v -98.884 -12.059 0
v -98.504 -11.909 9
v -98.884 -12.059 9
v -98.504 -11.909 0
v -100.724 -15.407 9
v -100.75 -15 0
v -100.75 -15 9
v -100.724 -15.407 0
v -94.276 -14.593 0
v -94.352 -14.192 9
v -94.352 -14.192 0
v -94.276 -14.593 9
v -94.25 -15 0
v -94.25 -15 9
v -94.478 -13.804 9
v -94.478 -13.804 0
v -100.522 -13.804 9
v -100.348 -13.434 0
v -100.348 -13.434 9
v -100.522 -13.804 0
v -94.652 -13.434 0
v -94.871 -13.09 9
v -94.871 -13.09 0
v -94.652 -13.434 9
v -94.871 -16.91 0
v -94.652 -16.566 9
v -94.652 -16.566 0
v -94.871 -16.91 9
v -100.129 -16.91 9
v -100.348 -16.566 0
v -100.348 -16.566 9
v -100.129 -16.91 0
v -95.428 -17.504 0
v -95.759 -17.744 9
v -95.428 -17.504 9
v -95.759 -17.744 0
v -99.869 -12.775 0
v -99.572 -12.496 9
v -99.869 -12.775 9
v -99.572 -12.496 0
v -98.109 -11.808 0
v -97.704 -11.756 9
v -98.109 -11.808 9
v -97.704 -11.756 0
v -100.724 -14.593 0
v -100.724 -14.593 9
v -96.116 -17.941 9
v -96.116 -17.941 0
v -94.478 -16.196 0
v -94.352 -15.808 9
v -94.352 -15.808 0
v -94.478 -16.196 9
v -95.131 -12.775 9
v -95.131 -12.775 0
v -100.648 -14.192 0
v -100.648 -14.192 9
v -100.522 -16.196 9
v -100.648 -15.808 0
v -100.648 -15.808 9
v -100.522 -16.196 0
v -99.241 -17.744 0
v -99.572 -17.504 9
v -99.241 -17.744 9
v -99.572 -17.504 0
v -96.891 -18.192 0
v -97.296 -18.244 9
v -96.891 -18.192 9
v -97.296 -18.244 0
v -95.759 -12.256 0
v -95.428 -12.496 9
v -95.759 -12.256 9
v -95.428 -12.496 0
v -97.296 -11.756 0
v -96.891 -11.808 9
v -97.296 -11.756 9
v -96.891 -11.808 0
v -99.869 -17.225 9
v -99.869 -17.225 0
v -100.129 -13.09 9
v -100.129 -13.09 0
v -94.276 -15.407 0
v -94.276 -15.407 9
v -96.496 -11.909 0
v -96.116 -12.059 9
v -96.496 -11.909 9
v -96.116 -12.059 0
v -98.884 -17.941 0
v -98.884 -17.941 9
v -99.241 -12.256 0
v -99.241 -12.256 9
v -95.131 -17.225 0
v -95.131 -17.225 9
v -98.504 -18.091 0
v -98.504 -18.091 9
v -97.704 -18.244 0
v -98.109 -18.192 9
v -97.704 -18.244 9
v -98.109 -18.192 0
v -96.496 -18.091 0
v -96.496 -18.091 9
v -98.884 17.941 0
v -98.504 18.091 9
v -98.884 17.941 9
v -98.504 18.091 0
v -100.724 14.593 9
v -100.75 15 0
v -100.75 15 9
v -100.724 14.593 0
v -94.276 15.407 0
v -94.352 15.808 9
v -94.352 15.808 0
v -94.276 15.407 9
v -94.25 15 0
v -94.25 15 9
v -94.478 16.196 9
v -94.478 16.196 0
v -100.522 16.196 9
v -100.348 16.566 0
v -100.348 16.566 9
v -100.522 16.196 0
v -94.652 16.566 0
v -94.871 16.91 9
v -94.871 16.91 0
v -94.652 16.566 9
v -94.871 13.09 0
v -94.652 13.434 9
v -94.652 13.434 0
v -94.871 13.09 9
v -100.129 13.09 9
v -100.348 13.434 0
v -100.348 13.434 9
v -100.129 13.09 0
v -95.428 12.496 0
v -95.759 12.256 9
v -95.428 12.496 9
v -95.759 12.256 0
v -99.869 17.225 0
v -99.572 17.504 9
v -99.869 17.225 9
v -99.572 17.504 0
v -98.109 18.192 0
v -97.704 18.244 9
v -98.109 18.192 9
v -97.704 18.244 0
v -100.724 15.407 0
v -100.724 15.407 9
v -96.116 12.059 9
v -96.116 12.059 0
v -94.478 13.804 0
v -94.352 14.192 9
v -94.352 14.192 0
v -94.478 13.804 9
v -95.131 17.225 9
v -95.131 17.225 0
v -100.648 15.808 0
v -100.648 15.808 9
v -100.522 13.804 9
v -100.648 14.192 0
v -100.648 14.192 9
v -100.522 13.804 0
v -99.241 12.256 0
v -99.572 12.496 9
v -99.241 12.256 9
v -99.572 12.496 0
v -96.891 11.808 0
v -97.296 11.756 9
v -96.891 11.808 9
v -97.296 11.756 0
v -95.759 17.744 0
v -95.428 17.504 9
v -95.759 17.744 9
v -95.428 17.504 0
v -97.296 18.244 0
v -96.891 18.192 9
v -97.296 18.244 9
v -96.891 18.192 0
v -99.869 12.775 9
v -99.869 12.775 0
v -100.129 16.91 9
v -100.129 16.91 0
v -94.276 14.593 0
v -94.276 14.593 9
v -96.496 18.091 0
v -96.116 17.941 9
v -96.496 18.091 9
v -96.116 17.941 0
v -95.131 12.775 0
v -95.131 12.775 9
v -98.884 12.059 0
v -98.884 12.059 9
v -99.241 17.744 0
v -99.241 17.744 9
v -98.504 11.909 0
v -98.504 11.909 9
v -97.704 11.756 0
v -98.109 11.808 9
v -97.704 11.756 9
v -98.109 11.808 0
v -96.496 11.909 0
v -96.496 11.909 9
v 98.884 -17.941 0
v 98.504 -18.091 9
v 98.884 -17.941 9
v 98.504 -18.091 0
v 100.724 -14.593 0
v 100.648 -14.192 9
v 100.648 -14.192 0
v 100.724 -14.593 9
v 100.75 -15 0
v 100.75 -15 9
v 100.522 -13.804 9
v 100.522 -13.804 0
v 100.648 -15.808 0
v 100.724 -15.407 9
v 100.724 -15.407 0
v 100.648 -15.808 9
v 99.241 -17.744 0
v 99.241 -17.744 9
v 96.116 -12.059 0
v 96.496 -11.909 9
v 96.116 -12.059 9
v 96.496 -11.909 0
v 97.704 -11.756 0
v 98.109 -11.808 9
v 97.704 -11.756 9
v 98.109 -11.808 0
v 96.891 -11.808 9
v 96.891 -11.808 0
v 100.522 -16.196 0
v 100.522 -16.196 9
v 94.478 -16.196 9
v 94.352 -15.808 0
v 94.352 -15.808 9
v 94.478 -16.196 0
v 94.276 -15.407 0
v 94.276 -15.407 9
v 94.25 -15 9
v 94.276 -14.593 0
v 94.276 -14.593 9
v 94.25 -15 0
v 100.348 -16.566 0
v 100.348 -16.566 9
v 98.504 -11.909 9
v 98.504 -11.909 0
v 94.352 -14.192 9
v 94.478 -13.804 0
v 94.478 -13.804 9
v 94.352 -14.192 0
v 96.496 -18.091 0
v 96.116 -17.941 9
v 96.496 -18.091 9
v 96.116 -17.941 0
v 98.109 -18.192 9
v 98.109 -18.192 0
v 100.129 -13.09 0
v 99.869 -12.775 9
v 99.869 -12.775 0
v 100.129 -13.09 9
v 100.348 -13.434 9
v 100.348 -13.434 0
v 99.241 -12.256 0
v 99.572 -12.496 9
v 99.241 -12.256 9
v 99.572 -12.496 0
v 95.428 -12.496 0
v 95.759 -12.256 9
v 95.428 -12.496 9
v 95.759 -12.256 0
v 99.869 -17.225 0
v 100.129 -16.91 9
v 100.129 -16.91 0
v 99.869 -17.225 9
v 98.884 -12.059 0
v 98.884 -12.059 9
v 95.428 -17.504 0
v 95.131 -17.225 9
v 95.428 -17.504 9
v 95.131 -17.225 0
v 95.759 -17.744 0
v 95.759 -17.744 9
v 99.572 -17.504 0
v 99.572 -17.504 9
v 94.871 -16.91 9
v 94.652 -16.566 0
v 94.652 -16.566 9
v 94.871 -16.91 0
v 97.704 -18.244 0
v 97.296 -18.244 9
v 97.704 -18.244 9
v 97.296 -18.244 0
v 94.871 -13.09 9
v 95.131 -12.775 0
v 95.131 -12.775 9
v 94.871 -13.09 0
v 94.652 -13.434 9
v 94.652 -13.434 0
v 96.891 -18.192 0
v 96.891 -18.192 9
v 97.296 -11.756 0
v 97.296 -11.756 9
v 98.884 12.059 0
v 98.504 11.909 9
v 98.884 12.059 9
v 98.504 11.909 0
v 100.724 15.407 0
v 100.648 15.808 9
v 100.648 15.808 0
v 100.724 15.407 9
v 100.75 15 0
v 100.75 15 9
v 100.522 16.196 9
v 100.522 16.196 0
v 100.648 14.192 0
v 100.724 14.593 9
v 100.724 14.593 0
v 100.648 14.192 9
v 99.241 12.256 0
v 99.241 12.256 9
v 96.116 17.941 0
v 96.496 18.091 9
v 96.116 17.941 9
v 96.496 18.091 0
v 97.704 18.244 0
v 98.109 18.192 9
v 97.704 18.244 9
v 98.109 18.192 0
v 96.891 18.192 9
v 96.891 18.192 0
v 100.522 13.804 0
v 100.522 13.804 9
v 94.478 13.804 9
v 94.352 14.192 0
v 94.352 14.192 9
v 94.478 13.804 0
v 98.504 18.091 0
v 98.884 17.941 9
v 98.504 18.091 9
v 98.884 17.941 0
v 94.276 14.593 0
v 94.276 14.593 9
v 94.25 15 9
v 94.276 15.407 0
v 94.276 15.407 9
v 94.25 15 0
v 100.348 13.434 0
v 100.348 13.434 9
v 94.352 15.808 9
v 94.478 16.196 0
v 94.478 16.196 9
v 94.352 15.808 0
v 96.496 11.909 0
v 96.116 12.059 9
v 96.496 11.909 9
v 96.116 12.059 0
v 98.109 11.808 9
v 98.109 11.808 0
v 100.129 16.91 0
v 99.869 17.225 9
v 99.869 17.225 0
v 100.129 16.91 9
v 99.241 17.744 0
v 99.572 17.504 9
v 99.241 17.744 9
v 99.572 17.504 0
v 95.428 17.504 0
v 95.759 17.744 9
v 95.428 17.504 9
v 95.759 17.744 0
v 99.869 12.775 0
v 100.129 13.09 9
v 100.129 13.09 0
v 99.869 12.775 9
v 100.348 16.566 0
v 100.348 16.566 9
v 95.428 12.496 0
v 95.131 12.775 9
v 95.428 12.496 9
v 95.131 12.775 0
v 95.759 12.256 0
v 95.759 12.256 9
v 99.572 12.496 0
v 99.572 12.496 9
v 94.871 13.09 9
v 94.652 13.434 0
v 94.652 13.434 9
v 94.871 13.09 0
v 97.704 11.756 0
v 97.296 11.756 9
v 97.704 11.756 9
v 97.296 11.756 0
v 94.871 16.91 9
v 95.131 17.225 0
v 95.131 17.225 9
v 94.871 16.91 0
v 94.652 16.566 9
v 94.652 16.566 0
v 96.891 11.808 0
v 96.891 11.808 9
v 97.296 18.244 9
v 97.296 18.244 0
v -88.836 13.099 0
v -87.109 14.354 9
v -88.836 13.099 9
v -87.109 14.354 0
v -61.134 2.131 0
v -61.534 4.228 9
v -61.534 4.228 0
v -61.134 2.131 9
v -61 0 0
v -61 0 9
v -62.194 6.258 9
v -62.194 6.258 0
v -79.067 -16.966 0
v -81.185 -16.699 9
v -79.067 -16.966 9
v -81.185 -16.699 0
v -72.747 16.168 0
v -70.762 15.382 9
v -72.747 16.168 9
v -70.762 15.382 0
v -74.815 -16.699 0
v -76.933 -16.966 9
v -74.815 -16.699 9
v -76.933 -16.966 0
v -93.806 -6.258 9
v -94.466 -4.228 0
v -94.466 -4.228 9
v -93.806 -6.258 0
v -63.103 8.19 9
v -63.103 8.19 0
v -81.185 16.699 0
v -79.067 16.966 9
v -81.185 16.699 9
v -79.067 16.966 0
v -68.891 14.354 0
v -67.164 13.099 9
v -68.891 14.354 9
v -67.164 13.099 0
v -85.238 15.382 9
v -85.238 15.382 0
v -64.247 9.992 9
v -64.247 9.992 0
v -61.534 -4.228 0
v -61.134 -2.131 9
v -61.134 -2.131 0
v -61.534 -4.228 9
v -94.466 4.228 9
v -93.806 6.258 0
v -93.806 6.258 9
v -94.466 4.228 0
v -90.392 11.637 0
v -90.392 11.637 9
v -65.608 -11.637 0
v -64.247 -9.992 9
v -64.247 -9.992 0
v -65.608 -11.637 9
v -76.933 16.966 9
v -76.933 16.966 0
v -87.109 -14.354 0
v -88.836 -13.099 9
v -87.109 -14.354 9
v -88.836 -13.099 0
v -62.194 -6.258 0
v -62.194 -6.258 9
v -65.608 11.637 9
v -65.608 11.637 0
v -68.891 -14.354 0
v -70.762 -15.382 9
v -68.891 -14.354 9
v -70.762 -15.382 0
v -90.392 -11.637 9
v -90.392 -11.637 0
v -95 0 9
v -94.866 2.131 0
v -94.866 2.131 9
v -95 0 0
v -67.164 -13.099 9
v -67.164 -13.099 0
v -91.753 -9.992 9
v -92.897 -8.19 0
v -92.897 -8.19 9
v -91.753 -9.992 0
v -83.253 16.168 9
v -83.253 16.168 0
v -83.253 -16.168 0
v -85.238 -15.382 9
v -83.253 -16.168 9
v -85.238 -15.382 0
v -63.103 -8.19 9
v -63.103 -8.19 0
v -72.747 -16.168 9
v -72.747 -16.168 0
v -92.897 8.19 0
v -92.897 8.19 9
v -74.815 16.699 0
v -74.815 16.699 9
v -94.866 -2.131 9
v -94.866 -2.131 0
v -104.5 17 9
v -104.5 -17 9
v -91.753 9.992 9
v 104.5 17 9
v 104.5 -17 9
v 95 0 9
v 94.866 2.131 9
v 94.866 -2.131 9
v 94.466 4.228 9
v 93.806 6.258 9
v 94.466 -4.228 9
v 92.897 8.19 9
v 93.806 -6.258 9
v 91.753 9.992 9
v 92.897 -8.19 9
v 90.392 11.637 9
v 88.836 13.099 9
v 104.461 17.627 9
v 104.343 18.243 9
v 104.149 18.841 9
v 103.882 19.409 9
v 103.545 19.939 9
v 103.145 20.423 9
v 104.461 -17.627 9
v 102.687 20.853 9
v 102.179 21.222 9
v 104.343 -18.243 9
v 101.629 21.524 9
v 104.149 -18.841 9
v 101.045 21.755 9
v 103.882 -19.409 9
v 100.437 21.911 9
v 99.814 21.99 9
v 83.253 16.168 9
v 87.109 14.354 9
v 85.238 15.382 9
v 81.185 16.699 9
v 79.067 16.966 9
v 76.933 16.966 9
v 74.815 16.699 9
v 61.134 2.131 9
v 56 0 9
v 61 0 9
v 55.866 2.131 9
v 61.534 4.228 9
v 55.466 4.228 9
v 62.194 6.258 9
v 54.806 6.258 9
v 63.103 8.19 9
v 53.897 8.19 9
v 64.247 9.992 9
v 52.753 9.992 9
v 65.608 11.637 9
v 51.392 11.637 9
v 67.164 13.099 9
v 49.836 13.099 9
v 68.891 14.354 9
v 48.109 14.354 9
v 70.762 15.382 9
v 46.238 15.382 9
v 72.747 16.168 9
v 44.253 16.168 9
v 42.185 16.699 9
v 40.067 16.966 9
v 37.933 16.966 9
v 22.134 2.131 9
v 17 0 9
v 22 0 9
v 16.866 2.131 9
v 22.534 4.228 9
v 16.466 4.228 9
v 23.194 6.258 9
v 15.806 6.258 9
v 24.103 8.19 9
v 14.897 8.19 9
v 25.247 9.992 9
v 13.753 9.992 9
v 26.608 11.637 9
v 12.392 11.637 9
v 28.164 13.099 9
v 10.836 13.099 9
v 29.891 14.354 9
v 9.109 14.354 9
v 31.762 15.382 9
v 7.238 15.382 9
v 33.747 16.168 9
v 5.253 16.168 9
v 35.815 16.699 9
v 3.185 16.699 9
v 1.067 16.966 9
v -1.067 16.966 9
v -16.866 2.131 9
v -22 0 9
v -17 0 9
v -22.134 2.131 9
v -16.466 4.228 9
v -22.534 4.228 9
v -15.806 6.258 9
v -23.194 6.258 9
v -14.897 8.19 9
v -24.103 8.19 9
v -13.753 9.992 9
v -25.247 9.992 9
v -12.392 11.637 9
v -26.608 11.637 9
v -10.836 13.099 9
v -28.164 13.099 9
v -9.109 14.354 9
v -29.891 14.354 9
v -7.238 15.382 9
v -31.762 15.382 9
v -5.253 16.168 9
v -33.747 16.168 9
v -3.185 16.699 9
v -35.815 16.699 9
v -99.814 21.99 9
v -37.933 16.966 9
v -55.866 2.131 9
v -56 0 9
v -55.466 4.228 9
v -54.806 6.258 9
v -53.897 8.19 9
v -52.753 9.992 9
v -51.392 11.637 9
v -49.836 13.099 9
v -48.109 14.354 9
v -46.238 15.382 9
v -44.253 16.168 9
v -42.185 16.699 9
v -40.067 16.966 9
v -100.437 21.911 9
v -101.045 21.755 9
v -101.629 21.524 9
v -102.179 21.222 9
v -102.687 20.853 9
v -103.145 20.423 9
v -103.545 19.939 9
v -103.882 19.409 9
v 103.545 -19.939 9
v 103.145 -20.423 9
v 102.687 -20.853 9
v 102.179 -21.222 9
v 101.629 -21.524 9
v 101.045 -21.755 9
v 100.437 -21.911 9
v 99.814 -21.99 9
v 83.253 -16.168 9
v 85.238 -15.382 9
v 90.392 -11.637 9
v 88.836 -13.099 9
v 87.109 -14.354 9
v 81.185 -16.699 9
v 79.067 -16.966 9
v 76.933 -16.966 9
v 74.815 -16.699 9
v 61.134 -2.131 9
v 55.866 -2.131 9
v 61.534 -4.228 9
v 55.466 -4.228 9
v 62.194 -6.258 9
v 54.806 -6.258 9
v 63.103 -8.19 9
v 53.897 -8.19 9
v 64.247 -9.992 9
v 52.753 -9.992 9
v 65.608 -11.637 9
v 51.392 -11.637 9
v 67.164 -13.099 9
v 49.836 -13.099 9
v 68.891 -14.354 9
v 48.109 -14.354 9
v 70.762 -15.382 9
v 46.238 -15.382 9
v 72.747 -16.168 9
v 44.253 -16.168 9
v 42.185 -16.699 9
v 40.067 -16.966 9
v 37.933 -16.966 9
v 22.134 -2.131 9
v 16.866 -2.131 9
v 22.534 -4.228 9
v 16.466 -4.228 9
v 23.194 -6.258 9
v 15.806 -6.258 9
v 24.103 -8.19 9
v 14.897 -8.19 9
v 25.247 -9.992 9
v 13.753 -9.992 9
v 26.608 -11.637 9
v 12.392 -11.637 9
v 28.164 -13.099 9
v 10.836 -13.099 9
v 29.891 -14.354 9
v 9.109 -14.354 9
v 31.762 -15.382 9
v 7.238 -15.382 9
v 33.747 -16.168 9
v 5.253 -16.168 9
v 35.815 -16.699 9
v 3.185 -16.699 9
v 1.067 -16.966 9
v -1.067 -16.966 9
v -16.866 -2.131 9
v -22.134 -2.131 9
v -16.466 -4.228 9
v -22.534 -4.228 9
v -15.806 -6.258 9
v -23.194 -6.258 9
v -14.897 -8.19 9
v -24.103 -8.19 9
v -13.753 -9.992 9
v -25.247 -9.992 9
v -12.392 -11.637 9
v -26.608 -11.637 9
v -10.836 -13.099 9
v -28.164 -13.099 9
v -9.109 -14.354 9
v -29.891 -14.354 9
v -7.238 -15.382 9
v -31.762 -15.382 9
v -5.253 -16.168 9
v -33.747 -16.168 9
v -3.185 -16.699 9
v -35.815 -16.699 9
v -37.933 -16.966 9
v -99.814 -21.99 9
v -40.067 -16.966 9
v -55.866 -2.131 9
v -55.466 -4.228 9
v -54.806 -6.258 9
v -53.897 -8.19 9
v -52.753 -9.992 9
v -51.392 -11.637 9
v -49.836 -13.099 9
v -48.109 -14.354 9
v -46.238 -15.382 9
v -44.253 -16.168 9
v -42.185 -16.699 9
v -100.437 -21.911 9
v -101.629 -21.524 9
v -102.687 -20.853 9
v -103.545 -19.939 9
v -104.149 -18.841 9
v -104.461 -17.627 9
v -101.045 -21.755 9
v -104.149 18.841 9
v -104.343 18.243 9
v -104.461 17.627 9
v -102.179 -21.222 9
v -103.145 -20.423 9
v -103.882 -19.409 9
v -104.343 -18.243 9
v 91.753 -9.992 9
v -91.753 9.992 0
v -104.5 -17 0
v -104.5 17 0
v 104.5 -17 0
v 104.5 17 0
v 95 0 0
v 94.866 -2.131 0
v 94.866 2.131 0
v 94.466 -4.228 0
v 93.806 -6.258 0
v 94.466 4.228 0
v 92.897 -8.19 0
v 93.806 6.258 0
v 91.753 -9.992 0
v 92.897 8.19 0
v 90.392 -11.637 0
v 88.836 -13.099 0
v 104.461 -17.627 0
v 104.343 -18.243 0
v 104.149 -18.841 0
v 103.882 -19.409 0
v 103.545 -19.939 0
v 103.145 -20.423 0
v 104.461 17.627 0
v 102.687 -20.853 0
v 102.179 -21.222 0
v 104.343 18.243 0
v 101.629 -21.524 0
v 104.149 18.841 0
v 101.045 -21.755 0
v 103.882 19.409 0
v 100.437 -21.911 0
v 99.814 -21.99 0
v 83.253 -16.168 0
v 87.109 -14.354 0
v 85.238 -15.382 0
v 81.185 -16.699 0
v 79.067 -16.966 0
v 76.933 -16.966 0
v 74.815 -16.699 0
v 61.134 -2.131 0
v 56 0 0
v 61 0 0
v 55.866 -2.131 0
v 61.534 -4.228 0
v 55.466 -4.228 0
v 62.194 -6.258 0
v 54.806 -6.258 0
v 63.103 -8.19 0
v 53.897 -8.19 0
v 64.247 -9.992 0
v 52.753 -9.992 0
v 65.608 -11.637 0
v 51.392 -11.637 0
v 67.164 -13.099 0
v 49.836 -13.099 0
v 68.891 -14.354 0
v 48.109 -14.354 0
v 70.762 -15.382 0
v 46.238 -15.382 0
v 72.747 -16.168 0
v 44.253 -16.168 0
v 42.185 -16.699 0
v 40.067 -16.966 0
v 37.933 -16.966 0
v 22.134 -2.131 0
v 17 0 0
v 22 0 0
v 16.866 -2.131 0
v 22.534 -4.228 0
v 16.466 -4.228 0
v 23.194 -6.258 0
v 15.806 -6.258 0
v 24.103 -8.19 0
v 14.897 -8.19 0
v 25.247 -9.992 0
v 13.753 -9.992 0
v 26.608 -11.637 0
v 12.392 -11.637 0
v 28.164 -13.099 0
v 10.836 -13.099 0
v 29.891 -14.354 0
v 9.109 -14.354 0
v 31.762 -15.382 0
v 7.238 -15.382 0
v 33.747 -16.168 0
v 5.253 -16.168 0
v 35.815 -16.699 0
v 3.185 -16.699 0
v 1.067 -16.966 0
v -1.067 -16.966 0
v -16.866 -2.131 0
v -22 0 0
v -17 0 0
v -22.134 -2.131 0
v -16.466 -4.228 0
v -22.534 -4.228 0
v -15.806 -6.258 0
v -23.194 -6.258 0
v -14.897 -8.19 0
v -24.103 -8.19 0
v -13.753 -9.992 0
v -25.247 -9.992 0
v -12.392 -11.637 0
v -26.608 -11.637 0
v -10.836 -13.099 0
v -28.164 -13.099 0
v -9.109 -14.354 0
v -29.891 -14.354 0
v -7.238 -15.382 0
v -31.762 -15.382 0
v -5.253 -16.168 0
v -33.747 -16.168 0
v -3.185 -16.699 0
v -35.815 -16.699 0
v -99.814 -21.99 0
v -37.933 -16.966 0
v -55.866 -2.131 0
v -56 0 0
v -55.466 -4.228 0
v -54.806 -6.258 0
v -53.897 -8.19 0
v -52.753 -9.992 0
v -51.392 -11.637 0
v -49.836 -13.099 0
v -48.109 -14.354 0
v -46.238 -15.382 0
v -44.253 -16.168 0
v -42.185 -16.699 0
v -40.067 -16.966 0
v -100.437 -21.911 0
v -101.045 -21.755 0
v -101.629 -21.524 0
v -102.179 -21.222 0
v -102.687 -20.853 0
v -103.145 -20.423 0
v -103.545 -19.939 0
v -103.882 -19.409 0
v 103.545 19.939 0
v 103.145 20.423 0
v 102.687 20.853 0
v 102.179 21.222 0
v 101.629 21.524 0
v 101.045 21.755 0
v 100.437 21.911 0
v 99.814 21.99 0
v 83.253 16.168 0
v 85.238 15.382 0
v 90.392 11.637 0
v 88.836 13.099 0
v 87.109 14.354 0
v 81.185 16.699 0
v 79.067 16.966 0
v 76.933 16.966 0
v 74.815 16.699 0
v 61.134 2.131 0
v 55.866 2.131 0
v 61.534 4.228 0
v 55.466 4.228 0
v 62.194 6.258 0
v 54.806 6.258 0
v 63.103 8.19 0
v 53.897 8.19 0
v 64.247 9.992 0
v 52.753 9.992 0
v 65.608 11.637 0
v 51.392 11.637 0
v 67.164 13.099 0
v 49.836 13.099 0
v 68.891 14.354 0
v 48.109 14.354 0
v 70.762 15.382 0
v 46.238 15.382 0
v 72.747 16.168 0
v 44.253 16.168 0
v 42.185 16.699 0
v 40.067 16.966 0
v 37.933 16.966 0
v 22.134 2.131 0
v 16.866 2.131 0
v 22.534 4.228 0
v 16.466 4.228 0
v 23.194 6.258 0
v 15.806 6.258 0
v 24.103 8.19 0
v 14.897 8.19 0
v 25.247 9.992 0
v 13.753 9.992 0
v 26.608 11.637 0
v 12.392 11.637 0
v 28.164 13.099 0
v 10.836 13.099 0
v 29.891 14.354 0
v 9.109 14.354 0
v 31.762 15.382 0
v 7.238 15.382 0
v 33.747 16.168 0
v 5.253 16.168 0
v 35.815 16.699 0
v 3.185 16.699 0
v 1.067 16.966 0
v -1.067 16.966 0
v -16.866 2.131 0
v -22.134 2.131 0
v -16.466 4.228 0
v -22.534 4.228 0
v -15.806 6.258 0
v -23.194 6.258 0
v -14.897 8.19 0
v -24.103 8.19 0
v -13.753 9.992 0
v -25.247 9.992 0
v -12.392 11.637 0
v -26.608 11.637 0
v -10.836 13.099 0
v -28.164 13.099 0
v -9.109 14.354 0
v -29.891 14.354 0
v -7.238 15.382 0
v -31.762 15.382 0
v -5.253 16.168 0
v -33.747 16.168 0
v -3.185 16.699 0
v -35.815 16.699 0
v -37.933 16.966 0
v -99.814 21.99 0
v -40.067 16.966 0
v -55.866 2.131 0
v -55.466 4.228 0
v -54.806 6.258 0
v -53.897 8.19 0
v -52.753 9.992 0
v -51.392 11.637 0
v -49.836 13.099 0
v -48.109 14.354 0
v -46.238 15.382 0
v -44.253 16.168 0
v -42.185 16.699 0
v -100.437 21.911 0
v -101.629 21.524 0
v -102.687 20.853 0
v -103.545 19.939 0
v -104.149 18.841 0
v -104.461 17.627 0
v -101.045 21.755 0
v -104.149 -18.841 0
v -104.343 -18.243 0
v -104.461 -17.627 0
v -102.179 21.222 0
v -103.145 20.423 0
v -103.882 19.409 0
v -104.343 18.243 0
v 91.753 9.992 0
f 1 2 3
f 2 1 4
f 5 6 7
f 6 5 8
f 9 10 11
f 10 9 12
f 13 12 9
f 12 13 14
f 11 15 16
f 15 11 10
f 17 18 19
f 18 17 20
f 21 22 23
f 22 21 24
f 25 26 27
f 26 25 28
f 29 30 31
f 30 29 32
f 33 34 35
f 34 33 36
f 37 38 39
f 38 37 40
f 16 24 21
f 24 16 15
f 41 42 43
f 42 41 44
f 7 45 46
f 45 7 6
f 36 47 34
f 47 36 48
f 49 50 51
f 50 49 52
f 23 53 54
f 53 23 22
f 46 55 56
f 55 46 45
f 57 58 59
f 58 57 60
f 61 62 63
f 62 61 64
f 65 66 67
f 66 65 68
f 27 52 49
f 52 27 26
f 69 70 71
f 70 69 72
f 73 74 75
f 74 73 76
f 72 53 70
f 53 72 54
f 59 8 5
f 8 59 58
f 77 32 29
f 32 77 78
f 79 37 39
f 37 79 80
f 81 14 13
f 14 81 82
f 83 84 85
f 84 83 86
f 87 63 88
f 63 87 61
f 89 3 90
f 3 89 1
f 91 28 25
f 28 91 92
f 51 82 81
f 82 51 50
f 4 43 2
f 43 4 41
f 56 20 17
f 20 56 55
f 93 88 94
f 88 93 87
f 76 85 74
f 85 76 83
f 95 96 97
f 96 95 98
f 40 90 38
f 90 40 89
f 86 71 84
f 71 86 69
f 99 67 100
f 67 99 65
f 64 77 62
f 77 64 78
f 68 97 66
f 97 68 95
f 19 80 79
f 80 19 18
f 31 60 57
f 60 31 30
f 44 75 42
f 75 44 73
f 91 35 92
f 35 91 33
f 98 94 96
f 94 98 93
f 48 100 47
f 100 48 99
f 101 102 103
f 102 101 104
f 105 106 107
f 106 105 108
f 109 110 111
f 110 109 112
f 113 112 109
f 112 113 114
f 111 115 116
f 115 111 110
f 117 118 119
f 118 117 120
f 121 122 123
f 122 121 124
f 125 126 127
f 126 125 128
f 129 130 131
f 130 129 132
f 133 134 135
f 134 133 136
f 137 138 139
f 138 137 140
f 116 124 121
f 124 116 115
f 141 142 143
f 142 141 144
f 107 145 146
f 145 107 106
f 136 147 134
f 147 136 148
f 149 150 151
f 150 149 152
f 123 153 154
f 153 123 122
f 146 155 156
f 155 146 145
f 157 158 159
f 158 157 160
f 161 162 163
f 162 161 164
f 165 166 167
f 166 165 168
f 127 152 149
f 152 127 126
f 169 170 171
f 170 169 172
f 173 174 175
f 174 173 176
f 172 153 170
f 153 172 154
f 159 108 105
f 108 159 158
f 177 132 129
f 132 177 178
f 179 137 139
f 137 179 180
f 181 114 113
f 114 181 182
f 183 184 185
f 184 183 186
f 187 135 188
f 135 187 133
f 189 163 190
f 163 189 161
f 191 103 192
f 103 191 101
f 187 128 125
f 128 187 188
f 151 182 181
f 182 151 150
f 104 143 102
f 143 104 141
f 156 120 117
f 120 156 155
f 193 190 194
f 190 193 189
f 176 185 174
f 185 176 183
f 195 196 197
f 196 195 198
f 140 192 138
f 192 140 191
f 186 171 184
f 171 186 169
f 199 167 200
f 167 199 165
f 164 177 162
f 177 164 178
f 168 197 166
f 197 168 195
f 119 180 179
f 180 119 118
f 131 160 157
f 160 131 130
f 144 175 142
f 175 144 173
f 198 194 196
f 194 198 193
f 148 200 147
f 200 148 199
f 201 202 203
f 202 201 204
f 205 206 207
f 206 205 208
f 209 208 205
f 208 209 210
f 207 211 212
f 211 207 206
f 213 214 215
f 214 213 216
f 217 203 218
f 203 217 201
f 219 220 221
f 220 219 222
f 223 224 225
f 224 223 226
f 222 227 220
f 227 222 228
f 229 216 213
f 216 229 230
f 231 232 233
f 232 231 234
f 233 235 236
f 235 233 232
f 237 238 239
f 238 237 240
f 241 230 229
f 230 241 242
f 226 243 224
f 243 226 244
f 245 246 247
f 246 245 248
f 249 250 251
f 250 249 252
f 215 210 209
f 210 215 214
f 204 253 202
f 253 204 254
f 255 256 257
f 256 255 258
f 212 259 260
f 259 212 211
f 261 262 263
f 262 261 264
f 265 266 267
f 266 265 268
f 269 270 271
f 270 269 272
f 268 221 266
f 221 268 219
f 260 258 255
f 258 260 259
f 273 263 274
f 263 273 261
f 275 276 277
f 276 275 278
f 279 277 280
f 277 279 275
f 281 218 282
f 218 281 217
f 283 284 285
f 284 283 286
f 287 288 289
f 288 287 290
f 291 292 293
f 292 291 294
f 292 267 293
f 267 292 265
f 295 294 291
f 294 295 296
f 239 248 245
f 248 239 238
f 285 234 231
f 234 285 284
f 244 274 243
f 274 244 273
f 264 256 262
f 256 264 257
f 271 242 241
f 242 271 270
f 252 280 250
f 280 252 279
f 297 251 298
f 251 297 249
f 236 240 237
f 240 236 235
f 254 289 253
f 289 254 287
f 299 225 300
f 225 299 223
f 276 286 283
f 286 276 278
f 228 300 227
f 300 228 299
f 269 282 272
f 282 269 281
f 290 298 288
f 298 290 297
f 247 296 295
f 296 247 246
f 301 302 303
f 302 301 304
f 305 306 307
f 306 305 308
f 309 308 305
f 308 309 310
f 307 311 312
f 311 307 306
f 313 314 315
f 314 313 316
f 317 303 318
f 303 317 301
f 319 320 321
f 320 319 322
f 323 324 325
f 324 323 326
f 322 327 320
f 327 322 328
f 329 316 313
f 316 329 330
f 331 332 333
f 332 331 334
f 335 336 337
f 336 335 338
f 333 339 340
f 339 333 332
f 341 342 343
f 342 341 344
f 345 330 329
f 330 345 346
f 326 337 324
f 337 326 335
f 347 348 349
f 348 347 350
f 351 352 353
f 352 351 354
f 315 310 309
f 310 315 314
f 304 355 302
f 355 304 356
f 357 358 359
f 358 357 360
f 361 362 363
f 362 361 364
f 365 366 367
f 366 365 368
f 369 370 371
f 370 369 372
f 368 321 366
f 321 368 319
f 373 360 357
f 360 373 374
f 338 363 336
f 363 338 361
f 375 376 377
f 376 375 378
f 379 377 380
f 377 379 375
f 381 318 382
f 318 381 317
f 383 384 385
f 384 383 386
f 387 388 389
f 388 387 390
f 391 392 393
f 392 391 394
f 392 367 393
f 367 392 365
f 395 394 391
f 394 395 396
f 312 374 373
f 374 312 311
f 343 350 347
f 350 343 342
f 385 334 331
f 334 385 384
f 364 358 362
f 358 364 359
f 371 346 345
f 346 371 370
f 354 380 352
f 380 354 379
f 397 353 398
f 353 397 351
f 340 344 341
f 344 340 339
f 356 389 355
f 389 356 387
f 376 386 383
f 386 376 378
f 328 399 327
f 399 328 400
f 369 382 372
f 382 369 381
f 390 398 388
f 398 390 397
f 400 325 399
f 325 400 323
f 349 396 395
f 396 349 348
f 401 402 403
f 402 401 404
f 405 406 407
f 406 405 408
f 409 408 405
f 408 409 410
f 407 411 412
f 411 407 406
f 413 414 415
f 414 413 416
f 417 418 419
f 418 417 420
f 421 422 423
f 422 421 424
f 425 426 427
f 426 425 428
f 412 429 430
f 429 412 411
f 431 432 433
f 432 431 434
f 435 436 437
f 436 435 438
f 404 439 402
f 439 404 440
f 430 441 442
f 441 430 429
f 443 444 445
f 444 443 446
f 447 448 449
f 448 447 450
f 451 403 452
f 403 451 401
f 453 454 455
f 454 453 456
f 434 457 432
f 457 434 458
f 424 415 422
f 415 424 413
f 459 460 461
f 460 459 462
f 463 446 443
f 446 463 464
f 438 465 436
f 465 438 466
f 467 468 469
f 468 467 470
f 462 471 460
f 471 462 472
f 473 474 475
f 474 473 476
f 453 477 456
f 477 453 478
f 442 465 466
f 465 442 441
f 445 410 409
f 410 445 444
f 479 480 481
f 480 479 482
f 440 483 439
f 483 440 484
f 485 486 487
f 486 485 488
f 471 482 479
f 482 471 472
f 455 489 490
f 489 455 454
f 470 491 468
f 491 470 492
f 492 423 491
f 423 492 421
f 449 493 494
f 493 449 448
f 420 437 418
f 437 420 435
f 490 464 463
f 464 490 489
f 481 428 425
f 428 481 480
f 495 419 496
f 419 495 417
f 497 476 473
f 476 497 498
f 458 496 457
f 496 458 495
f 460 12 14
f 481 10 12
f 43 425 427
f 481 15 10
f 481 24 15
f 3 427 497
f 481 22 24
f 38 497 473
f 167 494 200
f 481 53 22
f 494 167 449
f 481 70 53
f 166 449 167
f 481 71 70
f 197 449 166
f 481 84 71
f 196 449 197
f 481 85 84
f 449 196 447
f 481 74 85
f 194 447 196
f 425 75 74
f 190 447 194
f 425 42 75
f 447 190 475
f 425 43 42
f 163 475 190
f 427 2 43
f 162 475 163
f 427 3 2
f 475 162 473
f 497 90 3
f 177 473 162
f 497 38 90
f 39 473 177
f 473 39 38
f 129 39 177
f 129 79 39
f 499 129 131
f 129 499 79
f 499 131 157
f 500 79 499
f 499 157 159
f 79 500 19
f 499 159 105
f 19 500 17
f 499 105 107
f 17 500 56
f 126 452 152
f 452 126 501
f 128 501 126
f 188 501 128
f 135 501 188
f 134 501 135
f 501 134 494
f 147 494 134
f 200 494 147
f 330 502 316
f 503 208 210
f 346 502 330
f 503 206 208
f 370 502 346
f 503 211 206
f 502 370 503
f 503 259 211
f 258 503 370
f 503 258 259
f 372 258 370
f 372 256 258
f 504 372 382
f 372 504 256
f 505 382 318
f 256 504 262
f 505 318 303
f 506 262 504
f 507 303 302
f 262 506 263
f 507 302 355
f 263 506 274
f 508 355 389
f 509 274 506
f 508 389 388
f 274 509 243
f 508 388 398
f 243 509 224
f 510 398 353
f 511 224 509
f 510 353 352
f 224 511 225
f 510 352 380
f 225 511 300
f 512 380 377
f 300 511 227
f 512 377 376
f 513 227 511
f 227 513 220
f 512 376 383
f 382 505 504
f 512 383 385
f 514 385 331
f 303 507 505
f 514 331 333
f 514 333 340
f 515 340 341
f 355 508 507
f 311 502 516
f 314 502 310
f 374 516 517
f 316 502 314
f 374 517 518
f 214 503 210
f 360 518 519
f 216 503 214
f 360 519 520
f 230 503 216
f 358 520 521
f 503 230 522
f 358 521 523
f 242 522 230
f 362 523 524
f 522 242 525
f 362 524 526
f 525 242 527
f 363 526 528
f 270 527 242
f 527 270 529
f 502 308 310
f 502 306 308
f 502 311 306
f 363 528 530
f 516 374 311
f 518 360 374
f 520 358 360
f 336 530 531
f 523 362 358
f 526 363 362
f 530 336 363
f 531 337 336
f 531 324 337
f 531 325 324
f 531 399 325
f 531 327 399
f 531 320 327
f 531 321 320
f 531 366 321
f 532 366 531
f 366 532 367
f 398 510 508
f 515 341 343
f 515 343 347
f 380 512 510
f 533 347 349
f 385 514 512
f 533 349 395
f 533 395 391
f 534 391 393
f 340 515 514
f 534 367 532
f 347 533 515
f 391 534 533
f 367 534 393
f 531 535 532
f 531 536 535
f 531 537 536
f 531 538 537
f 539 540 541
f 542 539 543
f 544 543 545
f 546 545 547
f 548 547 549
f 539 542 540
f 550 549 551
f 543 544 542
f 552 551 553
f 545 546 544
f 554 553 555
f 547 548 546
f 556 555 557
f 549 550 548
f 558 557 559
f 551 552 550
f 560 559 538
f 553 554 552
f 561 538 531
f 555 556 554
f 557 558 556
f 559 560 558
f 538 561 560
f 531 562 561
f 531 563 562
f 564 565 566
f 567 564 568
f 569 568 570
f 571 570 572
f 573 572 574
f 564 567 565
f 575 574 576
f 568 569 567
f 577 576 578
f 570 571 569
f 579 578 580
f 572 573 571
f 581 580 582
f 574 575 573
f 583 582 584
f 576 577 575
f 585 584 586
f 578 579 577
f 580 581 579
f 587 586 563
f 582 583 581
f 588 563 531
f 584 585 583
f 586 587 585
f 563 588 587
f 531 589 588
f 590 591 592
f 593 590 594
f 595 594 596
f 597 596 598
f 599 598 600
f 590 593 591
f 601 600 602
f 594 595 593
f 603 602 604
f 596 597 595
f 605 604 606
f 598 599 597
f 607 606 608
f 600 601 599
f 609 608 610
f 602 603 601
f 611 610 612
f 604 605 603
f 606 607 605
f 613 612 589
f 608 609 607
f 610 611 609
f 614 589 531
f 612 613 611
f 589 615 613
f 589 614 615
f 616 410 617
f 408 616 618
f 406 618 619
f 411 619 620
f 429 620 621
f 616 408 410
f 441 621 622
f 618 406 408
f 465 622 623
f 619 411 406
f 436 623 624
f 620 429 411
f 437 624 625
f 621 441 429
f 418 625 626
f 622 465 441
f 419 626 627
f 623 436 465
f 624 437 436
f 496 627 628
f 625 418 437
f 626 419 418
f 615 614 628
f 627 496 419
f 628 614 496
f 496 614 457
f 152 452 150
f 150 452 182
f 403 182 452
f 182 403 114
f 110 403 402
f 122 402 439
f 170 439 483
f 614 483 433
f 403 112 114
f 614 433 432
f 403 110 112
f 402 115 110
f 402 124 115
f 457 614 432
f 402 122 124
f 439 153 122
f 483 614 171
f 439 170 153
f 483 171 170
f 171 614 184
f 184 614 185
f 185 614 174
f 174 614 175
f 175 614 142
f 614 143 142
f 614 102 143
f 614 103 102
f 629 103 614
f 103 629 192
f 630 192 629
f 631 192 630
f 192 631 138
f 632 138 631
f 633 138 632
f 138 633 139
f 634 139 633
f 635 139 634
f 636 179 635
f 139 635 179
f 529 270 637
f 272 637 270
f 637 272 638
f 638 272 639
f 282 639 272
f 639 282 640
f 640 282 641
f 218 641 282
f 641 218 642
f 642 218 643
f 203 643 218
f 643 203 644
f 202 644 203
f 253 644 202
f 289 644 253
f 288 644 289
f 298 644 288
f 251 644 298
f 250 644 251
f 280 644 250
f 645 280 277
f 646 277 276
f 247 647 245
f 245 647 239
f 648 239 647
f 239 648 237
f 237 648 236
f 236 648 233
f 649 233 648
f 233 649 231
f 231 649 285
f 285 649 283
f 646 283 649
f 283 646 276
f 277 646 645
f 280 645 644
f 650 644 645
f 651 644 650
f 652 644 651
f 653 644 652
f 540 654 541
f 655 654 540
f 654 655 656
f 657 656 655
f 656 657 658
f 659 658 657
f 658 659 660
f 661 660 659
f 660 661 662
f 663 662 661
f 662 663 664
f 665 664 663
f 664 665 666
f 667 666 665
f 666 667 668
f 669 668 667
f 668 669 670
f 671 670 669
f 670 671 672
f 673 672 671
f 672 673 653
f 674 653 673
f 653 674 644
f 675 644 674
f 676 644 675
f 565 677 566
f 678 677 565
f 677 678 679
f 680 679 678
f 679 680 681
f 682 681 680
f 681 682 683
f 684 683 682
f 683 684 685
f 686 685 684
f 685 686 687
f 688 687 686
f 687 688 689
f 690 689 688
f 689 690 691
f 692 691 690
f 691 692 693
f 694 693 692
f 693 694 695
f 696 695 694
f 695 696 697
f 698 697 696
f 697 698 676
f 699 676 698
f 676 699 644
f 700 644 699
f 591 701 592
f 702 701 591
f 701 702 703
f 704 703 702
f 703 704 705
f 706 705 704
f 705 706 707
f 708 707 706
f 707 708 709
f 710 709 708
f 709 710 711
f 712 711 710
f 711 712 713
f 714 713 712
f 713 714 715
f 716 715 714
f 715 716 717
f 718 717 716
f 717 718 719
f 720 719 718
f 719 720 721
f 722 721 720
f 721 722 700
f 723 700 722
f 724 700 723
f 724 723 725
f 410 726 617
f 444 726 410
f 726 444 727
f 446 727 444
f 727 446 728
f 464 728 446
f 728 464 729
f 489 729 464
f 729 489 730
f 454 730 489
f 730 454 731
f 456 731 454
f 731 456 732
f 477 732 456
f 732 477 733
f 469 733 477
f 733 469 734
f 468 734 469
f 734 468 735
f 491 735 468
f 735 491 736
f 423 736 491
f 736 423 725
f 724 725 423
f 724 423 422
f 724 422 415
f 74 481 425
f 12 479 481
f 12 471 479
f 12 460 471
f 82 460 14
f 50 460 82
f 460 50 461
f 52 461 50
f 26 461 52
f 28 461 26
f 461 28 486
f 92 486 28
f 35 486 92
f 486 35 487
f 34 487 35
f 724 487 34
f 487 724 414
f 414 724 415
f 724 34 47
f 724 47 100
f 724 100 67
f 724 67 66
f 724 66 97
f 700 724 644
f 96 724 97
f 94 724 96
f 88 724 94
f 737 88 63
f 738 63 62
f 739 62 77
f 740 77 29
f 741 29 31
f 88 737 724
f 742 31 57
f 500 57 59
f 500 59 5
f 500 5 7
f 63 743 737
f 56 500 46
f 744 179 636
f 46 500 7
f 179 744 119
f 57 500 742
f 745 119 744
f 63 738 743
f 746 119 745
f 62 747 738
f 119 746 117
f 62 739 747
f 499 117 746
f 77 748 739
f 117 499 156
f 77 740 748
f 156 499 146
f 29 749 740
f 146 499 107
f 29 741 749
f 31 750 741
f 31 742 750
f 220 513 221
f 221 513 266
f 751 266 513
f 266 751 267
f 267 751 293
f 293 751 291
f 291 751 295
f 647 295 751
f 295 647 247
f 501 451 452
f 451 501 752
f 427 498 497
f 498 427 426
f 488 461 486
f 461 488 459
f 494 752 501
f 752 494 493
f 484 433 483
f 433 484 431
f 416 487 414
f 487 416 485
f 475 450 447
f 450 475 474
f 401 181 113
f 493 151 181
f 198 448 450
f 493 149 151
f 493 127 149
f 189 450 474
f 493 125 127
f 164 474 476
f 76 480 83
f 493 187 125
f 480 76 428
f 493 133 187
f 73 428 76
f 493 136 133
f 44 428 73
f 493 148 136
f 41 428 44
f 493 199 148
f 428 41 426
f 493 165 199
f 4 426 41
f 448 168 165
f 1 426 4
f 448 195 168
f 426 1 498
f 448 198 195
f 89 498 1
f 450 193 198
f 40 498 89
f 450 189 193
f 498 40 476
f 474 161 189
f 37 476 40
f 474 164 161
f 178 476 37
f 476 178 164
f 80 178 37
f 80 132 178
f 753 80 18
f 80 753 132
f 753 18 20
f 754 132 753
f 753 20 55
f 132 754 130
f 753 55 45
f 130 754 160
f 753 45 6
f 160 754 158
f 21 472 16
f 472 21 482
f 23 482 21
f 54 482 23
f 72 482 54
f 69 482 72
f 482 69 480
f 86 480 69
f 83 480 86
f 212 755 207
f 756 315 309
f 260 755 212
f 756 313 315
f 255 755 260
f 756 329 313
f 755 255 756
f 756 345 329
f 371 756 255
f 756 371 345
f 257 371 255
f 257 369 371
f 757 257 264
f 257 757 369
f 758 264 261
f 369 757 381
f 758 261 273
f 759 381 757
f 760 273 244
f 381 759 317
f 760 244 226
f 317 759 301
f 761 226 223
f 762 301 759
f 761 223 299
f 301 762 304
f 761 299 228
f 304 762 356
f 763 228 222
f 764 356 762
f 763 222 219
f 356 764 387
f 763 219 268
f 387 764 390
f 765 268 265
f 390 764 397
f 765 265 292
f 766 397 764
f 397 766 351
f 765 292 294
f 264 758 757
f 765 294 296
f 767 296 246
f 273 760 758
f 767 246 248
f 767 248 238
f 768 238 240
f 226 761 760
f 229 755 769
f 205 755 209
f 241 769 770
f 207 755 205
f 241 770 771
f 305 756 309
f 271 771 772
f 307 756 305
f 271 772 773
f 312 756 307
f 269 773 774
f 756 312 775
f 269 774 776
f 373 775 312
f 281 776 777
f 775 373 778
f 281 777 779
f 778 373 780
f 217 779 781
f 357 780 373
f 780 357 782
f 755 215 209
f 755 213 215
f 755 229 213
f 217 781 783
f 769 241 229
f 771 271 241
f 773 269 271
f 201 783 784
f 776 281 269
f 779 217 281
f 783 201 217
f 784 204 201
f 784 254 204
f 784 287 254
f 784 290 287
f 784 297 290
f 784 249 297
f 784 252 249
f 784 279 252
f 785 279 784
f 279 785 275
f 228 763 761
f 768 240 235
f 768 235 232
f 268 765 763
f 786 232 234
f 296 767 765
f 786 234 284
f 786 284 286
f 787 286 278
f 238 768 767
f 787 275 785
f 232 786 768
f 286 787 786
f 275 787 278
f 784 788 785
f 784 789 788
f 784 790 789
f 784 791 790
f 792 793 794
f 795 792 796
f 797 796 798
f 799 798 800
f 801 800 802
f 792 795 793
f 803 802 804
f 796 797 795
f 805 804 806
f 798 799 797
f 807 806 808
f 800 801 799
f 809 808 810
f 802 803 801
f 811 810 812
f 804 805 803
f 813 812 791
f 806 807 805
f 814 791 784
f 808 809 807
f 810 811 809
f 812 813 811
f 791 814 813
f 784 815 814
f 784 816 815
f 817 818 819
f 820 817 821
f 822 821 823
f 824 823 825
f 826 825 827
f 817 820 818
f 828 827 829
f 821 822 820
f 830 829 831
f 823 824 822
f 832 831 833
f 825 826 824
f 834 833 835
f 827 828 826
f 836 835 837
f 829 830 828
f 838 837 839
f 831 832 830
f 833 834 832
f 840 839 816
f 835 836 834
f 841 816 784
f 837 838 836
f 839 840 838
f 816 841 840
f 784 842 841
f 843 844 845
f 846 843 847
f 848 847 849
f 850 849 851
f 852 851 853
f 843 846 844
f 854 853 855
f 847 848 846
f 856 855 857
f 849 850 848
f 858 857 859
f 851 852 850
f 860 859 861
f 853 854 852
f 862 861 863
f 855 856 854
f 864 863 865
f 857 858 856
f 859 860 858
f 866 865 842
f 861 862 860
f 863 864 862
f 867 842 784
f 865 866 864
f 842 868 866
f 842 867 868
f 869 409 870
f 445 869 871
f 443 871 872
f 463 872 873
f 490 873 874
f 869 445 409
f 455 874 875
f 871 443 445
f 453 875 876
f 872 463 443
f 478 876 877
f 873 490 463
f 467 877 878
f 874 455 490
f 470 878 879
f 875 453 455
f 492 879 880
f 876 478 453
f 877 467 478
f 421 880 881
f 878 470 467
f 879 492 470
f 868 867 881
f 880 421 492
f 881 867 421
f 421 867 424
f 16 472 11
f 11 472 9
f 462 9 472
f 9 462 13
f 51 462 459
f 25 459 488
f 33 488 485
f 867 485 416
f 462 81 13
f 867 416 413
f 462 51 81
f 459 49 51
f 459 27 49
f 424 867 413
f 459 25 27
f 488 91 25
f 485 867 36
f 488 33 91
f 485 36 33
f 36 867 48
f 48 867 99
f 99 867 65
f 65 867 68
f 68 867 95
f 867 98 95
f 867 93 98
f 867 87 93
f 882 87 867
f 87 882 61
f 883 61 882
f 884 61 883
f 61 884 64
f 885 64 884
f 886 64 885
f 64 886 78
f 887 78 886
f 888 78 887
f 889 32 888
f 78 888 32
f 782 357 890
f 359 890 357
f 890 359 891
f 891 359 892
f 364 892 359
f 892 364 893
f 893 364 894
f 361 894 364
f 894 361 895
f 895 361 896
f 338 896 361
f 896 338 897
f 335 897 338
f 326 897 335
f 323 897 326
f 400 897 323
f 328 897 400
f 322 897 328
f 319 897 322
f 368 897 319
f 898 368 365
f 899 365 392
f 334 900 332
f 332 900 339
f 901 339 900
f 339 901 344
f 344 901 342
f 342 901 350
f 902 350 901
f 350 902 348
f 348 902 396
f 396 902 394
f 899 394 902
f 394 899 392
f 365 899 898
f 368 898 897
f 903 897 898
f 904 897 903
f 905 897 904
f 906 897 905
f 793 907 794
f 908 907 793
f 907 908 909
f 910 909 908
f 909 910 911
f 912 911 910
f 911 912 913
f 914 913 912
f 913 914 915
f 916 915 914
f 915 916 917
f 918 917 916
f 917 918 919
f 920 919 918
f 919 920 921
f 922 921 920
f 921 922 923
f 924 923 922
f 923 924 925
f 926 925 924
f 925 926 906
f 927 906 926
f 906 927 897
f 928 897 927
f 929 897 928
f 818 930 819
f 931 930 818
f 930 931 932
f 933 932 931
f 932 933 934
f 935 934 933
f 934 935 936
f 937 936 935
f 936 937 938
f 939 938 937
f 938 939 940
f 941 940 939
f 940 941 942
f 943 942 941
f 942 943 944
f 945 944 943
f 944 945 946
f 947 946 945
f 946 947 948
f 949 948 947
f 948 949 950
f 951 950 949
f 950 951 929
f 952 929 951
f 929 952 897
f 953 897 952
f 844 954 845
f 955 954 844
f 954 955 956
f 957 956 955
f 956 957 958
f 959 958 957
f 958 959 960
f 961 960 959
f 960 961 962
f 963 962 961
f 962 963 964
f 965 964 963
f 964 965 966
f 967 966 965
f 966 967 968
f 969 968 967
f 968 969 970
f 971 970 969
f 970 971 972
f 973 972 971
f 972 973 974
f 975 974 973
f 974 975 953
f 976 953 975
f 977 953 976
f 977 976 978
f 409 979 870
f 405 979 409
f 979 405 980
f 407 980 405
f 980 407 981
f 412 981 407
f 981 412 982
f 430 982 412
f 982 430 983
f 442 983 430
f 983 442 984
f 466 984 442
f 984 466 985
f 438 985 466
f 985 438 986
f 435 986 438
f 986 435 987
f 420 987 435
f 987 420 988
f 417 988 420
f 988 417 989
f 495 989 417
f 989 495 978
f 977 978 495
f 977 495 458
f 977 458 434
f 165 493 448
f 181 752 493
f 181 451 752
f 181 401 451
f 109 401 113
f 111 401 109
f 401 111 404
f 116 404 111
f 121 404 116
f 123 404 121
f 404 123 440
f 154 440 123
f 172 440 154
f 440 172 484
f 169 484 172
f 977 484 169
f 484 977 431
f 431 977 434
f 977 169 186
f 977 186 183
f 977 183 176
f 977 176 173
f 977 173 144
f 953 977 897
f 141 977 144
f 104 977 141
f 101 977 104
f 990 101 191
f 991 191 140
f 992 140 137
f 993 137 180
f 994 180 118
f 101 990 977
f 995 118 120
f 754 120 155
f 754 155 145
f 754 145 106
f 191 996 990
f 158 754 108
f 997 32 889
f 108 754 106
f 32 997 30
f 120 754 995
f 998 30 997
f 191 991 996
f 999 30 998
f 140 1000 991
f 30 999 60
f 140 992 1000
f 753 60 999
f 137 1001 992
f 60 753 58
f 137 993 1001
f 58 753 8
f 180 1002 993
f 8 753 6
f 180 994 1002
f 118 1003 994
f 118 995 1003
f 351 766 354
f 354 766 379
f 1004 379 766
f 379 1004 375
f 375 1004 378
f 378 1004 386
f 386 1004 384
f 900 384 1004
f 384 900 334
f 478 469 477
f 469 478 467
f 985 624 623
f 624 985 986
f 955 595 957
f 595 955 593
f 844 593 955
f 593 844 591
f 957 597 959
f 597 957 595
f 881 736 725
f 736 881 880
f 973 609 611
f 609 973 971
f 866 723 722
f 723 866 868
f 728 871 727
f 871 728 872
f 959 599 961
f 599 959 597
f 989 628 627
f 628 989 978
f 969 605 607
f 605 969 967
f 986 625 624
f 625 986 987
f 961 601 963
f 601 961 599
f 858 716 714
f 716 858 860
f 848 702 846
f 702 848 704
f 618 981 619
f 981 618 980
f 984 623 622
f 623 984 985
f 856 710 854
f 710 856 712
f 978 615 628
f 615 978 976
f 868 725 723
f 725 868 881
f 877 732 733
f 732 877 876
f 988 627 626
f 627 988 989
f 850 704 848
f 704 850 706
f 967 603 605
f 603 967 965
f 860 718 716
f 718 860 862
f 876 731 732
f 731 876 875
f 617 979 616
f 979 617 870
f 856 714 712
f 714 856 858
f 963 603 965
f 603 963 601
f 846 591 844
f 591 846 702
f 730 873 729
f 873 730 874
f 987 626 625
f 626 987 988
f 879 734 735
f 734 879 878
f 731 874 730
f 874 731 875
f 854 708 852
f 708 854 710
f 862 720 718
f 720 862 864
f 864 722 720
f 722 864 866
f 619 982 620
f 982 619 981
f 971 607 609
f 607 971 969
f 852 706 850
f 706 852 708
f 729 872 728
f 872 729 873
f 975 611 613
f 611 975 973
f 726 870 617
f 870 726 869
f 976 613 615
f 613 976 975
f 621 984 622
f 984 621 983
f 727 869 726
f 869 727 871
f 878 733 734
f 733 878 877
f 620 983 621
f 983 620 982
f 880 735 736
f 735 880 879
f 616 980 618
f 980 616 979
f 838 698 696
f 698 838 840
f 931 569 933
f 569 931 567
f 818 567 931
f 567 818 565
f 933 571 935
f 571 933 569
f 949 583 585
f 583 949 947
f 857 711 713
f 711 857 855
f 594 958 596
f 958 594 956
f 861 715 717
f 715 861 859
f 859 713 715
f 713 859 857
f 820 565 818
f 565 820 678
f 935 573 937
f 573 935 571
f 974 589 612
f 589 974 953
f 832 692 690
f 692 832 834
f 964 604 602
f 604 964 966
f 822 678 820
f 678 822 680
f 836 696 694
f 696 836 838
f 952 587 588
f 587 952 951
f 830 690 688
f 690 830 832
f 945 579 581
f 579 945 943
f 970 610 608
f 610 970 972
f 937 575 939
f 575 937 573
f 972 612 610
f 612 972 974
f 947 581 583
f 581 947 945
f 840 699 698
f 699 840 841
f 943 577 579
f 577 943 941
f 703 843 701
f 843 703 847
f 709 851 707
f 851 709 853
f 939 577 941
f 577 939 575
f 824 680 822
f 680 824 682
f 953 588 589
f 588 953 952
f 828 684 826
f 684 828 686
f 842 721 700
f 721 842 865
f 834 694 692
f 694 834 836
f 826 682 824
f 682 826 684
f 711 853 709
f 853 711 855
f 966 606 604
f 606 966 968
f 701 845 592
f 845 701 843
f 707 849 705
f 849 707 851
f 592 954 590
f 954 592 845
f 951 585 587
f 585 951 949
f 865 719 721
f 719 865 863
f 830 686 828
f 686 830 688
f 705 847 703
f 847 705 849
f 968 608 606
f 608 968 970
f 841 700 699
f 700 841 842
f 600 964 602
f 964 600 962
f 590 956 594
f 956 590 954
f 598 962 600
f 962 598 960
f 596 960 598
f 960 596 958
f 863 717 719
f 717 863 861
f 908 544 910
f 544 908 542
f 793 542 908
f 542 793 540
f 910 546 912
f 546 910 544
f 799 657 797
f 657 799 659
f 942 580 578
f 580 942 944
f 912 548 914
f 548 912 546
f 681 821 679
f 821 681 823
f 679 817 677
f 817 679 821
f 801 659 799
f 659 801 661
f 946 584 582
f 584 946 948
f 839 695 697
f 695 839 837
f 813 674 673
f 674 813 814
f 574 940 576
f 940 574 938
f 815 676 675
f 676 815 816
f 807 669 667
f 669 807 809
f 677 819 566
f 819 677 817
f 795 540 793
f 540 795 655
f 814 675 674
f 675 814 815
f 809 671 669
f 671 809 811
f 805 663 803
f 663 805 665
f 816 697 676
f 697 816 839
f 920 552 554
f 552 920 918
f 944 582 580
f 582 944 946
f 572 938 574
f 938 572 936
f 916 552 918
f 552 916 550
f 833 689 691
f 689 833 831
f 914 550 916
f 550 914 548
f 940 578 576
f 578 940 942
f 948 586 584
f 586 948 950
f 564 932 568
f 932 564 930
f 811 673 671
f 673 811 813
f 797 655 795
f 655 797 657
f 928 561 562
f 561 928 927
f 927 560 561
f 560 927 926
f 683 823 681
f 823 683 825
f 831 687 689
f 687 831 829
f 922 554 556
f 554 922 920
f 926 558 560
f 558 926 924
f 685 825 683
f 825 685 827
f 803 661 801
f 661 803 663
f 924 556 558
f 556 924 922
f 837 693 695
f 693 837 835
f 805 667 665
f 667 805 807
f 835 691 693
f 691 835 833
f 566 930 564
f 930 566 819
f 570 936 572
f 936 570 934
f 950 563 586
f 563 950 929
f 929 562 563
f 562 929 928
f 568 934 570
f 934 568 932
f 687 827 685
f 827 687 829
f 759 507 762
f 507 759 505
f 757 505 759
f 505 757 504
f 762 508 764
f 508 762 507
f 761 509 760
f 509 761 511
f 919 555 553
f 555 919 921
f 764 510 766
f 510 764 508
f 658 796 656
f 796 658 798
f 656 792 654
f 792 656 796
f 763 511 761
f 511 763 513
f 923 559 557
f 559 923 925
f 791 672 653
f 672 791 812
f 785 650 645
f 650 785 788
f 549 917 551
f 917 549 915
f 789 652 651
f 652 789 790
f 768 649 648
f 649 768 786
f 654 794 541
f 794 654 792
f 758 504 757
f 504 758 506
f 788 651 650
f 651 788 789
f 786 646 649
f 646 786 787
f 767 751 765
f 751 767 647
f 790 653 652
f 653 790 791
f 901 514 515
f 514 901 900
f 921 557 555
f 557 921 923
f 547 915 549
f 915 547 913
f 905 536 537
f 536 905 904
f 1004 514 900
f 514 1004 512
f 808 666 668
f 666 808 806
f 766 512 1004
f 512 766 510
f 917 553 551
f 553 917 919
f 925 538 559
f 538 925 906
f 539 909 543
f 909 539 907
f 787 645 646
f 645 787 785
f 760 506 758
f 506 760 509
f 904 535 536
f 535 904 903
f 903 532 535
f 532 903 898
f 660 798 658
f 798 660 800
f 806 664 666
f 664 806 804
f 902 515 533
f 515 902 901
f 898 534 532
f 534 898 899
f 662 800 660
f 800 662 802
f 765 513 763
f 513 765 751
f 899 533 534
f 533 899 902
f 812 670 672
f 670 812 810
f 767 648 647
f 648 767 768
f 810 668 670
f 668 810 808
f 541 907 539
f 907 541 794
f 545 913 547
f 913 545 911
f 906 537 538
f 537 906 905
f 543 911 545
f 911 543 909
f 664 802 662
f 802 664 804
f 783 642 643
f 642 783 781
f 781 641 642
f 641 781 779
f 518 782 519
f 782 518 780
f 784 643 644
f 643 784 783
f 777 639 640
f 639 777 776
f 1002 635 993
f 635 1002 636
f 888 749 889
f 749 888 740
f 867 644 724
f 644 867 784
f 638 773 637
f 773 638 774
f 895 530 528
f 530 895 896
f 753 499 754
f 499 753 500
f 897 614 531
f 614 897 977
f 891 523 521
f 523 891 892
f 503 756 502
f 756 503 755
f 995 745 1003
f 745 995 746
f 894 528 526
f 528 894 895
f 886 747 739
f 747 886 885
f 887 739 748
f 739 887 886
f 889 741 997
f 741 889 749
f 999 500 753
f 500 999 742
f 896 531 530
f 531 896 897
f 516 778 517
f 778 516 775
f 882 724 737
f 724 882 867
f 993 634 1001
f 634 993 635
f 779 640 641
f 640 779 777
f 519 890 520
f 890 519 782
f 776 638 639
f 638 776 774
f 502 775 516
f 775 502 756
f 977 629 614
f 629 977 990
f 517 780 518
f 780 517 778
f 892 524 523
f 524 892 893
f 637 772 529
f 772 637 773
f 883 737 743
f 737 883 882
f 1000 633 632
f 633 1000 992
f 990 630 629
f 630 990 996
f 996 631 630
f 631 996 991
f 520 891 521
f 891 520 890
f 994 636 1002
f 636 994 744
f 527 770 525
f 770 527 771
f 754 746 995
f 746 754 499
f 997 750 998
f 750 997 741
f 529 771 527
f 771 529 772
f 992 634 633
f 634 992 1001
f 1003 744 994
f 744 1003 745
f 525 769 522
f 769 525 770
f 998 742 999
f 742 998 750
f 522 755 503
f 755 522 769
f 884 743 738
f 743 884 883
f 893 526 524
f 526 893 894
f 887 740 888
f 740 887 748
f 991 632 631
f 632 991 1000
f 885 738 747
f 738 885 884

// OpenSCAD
$fn = 50;

difference() {
	union() {
		hull() {
			translate(v = [-99.5, 17.0, 0]) {
				cylinder(h = 9, r = 5);
			}
			translate(v = [99.5, 17.0, 0]) {
				cylinder(h = 9, r = 5);
			}
			translate(v = [-99.5, -17.0, 0]) {
				cylinder(h = 9, r = 5);
			}
			translate(v = [99.5, -17.0, 0]) {
				cylinder(h = 9, r = 5);
			}
		}
	}
	union() {
		translate(v = [-97.5, -15.0, -100.0]) {
			cylinder(h = 200, r = 3.25);
		}
		translate(v = [-97.5, 15.0, -100.0]) {
			cylinder(h = 200, r = 3.25);
		}
		translate(v = [97.5, -15.0, -100.0]) {
			cylinder(h = 200, r = 3.25);
		}
		translate(v = [97.5, 15.0, -100.0]) {
			cylinder(h = 200, r = 3.25);
		}
		translate(v = [-97.5, -15.0, -100.0]) {
			cylinder(h = 200, r = 1.8);
		}
		translate(v = [-97.5, 15.0, -100.0]) {
			cylinder(h = 200, r = 1.8);
		}
		translate(v = [97.5, -15.0, -100.0]) {
			cylinder(h = 200, r = 1.8);
		}
		translate(v = [97.5, 15.0, -100.0]) {
			cylinder(h = 200, r = 1.8);
		}
		translate(v = [-78.0, 0, 0.0]) {
			cylinder(h = 9, r = 17.0);
		}
		translate(v = [-39.0, 0, 0.0]) {
			cylinder(h = 9, r = 17.0);
		}
		cylinder(h = 9, r = 17.0);
		translate(v = [39.0, 0, 0.0]) {
			cylinder(h = 9, r = 17.0);
		}
		translate(v = [78.0, 0, 0.0]) {
			cylinder(h = 9, r = 17.0);
		}
	}
}
